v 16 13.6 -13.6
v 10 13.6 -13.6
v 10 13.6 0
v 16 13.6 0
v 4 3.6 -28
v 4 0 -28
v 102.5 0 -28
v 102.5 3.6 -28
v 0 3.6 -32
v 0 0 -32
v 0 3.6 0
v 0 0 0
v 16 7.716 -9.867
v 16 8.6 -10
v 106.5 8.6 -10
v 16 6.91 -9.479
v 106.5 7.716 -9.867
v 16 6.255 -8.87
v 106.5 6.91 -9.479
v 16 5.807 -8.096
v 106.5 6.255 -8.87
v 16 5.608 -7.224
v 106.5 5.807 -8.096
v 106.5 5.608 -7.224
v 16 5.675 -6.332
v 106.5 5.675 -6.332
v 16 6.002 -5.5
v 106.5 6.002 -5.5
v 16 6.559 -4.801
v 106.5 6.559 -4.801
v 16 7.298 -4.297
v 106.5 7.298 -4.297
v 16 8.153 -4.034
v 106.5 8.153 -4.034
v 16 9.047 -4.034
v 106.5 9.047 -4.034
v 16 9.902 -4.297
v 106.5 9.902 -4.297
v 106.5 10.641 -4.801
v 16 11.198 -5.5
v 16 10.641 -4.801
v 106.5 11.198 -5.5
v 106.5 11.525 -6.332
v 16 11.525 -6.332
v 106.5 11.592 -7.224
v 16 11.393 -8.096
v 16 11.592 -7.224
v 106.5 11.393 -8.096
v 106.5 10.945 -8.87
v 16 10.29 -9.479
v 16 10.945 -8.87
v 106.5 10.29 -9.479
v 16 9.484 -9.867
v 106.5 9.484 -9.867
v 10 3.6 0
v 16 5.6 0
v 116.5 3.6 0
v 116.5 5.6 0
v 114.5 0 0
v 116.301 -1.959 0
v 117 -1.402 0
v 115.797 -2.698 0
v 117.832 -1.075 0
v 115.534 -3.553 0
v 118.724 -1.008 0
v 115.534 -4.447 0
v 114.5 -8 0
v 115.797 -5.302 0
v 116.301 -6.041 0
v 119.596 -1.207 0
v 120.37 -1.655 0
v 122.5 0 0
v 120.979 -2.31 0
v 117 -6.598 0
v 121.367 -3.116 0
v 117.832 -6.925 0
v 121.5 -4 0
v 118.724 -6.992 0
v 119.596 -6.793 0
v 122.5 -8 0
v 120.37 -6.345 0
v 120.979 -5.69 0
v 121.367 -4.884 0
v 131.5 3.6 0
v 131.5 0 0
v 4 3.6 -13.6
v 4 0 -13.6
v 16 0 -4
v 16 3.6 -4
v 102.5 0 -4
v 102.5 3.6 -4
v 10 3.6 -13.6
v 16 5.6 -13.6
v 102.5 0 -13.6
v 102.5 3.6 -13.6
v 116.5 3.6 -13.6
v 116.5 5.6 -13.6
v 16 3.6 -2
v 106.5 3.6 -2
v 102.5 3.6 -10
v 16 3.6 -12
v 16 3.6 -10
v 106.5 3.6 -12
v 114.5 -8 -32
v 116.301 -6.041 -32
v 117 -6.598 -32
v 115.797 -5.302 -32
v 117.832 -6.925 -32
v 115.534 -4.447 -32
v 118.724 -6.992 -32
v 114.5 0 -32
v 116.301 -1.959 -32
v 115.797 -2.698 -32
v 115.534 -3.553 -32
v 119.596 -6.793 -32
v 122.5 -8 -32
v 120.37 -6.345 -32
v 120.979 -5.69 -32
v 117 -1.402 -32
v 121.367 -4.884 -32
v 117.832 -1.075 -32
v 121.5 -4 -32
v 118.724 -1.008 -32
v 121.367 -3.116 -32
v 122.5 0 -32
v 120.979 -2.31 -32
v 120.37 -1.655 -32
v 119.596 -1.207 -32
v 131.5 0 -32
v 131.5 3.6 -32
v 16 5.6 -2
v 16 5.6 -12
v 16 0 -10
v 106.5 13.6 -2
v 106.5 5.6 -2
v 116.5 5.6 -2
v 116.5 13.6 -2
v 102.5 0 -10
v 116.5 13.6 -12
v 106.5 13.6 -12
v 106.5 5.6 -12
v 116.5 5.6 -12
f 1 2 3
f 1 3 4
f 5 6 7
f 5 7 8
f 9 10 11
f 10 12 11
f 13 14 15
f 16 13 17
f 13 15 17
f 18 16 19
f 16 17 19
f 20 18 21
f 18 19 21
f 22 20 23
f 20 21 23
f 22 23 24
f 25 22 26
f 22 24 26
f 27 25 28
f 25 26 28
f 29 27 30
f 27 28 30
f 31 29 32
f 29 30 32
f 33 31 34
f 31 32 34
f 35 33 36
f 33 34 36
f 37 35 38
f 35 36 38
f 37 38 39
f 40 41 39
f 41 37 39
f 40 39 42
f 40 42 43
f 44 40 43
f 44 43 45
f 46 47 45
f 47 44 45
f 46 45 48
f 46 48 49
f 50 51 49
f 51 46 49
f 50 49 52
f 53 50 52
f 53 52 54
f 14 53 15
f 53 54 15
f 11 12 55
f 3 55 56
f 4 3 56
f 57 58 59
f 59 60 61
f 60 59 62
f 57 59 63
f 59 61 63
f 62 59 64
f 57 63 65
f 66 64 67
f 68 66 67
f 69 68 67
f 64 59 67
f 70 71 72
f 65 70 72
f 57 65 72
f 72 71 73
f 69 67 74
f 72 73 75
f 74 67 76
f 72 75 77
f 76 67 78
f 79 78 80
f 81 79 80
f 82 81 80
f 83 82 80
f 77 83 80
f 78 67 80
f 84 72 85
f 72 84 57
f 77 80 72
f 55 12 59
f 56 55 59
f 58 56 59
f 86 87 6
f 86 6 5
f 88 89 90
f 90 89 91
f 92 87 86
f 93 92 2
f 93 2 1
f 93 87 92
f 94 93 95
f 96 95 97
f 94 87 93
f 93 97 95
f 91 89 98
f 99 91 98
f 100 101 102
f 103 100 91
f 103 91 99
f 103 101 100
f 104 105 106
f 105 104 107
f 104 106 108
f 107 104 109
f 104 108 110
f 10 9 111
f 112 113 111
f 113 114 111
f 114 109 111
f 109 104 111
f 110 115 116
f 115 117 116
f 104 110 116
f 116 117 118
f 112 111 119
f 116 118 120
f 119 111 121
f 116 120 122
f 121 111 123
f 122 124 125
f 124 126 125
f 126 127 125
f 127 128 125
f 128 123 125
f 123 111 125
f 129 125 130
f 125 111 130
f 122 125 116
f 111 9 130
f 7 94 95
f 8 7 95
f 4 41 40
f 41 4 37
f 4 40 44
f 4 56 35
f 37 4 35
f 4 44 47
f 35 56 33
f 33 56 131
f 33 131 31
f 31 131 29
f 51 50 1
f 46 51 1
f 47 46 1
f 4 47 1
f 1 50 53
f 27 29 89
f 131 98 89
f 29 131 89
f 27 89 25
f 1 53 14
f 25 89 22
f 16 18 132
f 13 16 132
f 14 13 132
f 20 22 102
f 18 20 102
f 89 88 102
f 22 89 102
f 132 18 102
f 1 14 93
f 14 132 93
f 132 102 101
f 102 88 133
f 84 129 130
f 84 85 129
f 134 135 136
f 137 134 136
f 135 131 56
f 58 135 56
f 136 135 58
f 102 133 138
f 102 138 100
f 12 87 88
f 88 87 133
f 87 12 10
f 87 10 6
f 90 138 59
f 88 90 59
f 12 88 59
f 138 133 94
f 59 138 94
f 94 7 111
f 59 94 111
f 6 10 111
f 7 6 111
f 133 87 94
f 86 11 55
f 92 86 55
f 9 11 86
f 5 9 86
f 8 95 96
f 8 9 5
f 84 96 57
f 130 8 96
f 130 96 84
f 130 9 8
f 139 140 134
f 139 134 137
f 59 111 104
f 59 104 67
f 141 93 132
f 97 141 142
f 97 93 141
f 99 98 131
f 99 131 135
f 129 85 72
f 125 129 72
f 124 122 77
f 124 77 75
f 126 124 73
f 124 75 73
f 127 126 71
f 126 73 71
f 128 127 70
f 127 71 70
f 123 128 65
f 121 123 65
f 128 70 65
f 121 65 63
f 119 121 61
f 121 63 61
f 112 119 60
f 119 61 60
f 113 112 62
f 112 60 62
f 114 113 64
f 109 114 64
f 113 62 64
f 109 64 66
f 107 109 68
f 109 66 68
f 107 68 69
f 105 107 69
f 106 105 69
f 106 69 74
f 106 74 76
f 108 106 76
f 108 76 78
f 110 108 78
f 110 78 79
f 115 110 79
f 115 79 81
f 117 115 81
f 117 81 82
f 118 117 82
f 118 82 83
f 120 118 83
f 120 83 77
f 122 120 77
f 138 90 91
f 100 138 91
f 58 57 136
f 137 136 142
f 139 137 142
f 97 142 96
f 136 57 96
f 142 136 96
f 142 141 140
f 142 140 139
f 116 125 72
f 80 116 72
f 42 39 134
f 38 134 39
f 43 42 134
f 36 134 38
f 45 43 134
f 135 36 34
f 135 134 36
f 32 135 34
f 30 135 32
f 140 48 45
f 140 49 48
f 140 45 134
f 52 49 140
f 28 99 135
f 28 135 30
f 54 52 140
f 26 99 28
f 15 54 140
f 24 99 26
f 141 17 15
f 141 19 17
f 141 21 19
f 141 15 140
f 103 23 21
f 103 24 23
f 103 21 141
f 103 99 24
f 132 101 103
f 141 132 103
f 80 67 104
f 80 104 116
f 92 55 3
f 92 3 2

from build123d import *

# Parameters (mm, degrees)
SKETCH_1_W          = 131.5
SKETCH_1_H          = 3.6
EXTRUDE_1_DEPTH     = 4
SKETCH_2_W          = 4
SKETCH_2_H          = 3.6
EXTRUDE_2_DEPTH     = 28
SKETCH_3_W          = 4
SKETCH_3_H          = 3.6
EXTRUDE_3_DEPTH     = 28
SKETCH_4_W          = 4
SKETCH_4_H          = 3.6
EXTRUDE_4_DEPTH     = 123.5
SKETCH_5_W          = 8
SKETCH_5_H          = 32
EXTRUDE_5_DEPTH     = 8
CUT_EXTRUDE_1_REACH = 137.574
SKETCH_6_R          = 3
EXTRUDE_6_REACH     = 136.686
SKETCH_7_W          = 25
SKETCH_7_H          = 3.6
EXTRUDE_7_REACH     = 109.677
SKETCH_8_W          = 3.6
SKETCH_8_H          = 3.6
SKETCH_13_W         = 10
SKETCH_13_H         = 10
EXTRUDE_8_DEPTH     = 10
EXTRUDE_9_REACH     = 136.019
SKETCH_14_W         = 12
SKETCH_14_H         = 3.6
SKETCH_15_W         = 6
SKETCH_15_H         = 13.6
EXTRUDE_10_DEPTH    = 10
EXTRUDE_11_REACH    = 114.032
SKETCH_16_R         = 3
SKETCH_17_W         = 100.5
SKETCH_17_H         = 2
EXTRUDE_12_DEPTH    = 2
SKETCH_18_W         = 100.5
SKETCH_18_H         = 1.6
EXTRUDE_13_DEPTH    = 2


with BuildPart() as part:
    # 草图1 → 凸台-拉伸1 (new body)
    with BuildSketch(Plane.XY):
        with Locations((65.75, 1.8)):
            Rectangle(SKETCH_1_W, SKETCH_1_H)
    extrude(amount=-EXTRUDE_1_DEPTH)

    # 草图2 → 凸台-拉伸2 (add)
    with BuildSketch(Plane(origin=(0, 0, -4), x_dir=(-1, 0, 0), z_dir=(0, 0, -1))):
        with Locations((-2, 1.8)):
            Rectangle(SKETCH_2_W, SKETCH_2_H)
    extrude(amount=EXTRUDE_2_DEPTH)

    # 草图3 → 凸台-拉伸3 (add)
    with BuildSketch(Plane(origin=(0, 0, -4), x_dir=(-1, 0, 0), z_dir=(0, 0, -1))):
        with Locations((-129.5, 1.8)):
            Rectangle(SKETCH_3_W, SKETCH_3_H)
    extrude(amount=EXTRUDE_3_DEPTH)

    # 草图4 → 凸台-拉伸4 (add)
    with BuildSketch(Plane(origin=(4, 0, 0), x_dir=(0, 0, -1), z_dir=(1, 0, 0))):
        with Locations((30, 1.8)):
            Rectangle(SKETCH_4_W, SKETCH_4_H)
    extrude(amount=EXTRUDE_4_DEPTH)

    # 草图5 → 凸台-拉伸5 (add)
    with BuildSketch(Plane.XZ):
        with Locations((118.5, -16)):
            Rectangle(SKETCH_5_W, SKETCH_5_H)
    extrude(amount=EXTRUDE_5_DEPTH)

    # 草图6 → 切除-拉伸1 (cut, up to next)
    with BuildSketch(Plane.XY, mode=Mode.PRIVATE) as cut_extrude_1_sk1:
        with Locations((118.5, -4)):
            Circle(SKETCH_6_R)
    cut_extrude_1_tool1 = extrude(cut_extrude_1_sk1.sketch, amount=-CUT_EXTRUDE_1_REACH, mode=Mode.PRIVATE) & part.part
    add(cut_extrude_1_tool1.solids().sort_by_distance((118.5, -4, 0))[0], mode=Mode.SUBTRACT)

    # 草图7 → 凸台-拉伸6 (add, up to next)
    with BuildSketch(Plane(origin=(0, 0, -4), x_dir=(-1, 0, 0), z_dir=(0, 0, -1)), mode=Mode.PRIVATE) as extrude_6_sk1:
        with Locations((-115, 1.8)):
            Rectangle(SKETCH_7_W, SKETCH_7_H)
    extrude_6_tool1 = extrude(extrude_6_sk1.sketch, amount=EXTRUDE_6_REACH, mode=Mode.PRIVATE) - part.part
    add(extrude_6_tool1.solids().sort_by_distance((115, 1.8, -4))[0])

    # 草图8 → 凸台-拉伸7 (add, up to next)
    with BuildSketch(Plane.ZY.offset(-102.5), mode=Mode.PRIVATE) as extrude_7_sk1:
        with Locations((-11.8, 1.8)):
            Rectangle(SKETCH_8_W, SKETCH_8_H)
    extrude_7_tool1 = extrude(extrude_7_sk1.sketch, amount=EXTRUDE_7_REACH, mode=Mode.PRIVATE) - part.part
    add(extrude_7_tool1.solids().sort_by_distance((102.5, 1.8, -11.8))[0])

    # 草图13 → 凸台-拉伸8 (add)
    with BuildSketch(Plane(origin=(0, 3.6, 0), x_dir=(1, 0, 0), z_dir=(0, 1, 0))):
        with Locations((111.5, 7)):
            Rectangle(SKETCH_13_W, SKETCH_13_H)
    extrude(amount=EXTRUDE_8_DEPTH)

    # 草图14 → 凸台-拉伸9 (add, up to next)
    with BuildSketch(Plane.XY.offset(-10), mode=Mode.PRIVATE) as extrude_9_sk1:
        with Locations((10, 1.8)):
            Rectangle(SKETCH_14_W, SKETCH_14_H)
    extrude_9_tool1 = extrude(extrude_9_sk1.sketch, amount=EXTRUDE_9_REACH, mode=Mode.PRIVATE) - part.part
    add(extrude_9_tool1.solids().sort_by_distance((10, 1.8, -10))[0])

    # 草图15 → 凸台-拉伸10 (add)
    with BuildSketch(Plane(origin=(0, 3.6, 0), x_dir=(1, 0, 0), z_dir=(0, 1, 0))):
        with Locations((13, 6.8)):
            Rectangle(SKETCH_15_W, SKETCH_15_H)
    extrude(amount=EXTRUDE_10_DEPTH)

    # 草图16 → 凸台-拉伸11 (add, up to next)
    with BuildSketch(Plane.ZY.offset(-106.5), mode=Mode.PRIVATE) as extrude_11_sk1:
        with Locations(Location((-7, 8.6, 0), (0, 0, 180))):
            Circle(SKETCH_16_R)
    extrude_11_tool1 = extrude(extrude_11_sk1.sketch, amount=EXTRUDE_11_REACH, mode=Mode.PRIVATE) - part.part
    add(extrude_11_tool1.solids().sort_by_distance((106.5, 8.6, -7))[0])

    # 草图17 → 凸台-拉伸12 (add)
    with BuildSketch(Plane(origin=(0, 3.6, 0), x_dir=(1, 0, 0), z_dir=(0, 1, 0))):
        with Locations((66.25, 1)):
            Rectangle(SKETCH_17_W, SKETCH_17_H)
    extrude(amount=EXTRUDE_12_DEPTH)

    # 草图18 → 凸台-拉伸13 (add)
    with BuildSketch(Plane(origin=(0, 3.6, 0), x_dir=(1, 0, 0), z_dir=(0, 1, 0))):
        with Locations((66.25, 12.8)):
            Rectangle(SKETCH_18_W, SKETCH_18_H)
    extrude(amount=EXTRUDE_13_DEPTH)


solid = part.part
